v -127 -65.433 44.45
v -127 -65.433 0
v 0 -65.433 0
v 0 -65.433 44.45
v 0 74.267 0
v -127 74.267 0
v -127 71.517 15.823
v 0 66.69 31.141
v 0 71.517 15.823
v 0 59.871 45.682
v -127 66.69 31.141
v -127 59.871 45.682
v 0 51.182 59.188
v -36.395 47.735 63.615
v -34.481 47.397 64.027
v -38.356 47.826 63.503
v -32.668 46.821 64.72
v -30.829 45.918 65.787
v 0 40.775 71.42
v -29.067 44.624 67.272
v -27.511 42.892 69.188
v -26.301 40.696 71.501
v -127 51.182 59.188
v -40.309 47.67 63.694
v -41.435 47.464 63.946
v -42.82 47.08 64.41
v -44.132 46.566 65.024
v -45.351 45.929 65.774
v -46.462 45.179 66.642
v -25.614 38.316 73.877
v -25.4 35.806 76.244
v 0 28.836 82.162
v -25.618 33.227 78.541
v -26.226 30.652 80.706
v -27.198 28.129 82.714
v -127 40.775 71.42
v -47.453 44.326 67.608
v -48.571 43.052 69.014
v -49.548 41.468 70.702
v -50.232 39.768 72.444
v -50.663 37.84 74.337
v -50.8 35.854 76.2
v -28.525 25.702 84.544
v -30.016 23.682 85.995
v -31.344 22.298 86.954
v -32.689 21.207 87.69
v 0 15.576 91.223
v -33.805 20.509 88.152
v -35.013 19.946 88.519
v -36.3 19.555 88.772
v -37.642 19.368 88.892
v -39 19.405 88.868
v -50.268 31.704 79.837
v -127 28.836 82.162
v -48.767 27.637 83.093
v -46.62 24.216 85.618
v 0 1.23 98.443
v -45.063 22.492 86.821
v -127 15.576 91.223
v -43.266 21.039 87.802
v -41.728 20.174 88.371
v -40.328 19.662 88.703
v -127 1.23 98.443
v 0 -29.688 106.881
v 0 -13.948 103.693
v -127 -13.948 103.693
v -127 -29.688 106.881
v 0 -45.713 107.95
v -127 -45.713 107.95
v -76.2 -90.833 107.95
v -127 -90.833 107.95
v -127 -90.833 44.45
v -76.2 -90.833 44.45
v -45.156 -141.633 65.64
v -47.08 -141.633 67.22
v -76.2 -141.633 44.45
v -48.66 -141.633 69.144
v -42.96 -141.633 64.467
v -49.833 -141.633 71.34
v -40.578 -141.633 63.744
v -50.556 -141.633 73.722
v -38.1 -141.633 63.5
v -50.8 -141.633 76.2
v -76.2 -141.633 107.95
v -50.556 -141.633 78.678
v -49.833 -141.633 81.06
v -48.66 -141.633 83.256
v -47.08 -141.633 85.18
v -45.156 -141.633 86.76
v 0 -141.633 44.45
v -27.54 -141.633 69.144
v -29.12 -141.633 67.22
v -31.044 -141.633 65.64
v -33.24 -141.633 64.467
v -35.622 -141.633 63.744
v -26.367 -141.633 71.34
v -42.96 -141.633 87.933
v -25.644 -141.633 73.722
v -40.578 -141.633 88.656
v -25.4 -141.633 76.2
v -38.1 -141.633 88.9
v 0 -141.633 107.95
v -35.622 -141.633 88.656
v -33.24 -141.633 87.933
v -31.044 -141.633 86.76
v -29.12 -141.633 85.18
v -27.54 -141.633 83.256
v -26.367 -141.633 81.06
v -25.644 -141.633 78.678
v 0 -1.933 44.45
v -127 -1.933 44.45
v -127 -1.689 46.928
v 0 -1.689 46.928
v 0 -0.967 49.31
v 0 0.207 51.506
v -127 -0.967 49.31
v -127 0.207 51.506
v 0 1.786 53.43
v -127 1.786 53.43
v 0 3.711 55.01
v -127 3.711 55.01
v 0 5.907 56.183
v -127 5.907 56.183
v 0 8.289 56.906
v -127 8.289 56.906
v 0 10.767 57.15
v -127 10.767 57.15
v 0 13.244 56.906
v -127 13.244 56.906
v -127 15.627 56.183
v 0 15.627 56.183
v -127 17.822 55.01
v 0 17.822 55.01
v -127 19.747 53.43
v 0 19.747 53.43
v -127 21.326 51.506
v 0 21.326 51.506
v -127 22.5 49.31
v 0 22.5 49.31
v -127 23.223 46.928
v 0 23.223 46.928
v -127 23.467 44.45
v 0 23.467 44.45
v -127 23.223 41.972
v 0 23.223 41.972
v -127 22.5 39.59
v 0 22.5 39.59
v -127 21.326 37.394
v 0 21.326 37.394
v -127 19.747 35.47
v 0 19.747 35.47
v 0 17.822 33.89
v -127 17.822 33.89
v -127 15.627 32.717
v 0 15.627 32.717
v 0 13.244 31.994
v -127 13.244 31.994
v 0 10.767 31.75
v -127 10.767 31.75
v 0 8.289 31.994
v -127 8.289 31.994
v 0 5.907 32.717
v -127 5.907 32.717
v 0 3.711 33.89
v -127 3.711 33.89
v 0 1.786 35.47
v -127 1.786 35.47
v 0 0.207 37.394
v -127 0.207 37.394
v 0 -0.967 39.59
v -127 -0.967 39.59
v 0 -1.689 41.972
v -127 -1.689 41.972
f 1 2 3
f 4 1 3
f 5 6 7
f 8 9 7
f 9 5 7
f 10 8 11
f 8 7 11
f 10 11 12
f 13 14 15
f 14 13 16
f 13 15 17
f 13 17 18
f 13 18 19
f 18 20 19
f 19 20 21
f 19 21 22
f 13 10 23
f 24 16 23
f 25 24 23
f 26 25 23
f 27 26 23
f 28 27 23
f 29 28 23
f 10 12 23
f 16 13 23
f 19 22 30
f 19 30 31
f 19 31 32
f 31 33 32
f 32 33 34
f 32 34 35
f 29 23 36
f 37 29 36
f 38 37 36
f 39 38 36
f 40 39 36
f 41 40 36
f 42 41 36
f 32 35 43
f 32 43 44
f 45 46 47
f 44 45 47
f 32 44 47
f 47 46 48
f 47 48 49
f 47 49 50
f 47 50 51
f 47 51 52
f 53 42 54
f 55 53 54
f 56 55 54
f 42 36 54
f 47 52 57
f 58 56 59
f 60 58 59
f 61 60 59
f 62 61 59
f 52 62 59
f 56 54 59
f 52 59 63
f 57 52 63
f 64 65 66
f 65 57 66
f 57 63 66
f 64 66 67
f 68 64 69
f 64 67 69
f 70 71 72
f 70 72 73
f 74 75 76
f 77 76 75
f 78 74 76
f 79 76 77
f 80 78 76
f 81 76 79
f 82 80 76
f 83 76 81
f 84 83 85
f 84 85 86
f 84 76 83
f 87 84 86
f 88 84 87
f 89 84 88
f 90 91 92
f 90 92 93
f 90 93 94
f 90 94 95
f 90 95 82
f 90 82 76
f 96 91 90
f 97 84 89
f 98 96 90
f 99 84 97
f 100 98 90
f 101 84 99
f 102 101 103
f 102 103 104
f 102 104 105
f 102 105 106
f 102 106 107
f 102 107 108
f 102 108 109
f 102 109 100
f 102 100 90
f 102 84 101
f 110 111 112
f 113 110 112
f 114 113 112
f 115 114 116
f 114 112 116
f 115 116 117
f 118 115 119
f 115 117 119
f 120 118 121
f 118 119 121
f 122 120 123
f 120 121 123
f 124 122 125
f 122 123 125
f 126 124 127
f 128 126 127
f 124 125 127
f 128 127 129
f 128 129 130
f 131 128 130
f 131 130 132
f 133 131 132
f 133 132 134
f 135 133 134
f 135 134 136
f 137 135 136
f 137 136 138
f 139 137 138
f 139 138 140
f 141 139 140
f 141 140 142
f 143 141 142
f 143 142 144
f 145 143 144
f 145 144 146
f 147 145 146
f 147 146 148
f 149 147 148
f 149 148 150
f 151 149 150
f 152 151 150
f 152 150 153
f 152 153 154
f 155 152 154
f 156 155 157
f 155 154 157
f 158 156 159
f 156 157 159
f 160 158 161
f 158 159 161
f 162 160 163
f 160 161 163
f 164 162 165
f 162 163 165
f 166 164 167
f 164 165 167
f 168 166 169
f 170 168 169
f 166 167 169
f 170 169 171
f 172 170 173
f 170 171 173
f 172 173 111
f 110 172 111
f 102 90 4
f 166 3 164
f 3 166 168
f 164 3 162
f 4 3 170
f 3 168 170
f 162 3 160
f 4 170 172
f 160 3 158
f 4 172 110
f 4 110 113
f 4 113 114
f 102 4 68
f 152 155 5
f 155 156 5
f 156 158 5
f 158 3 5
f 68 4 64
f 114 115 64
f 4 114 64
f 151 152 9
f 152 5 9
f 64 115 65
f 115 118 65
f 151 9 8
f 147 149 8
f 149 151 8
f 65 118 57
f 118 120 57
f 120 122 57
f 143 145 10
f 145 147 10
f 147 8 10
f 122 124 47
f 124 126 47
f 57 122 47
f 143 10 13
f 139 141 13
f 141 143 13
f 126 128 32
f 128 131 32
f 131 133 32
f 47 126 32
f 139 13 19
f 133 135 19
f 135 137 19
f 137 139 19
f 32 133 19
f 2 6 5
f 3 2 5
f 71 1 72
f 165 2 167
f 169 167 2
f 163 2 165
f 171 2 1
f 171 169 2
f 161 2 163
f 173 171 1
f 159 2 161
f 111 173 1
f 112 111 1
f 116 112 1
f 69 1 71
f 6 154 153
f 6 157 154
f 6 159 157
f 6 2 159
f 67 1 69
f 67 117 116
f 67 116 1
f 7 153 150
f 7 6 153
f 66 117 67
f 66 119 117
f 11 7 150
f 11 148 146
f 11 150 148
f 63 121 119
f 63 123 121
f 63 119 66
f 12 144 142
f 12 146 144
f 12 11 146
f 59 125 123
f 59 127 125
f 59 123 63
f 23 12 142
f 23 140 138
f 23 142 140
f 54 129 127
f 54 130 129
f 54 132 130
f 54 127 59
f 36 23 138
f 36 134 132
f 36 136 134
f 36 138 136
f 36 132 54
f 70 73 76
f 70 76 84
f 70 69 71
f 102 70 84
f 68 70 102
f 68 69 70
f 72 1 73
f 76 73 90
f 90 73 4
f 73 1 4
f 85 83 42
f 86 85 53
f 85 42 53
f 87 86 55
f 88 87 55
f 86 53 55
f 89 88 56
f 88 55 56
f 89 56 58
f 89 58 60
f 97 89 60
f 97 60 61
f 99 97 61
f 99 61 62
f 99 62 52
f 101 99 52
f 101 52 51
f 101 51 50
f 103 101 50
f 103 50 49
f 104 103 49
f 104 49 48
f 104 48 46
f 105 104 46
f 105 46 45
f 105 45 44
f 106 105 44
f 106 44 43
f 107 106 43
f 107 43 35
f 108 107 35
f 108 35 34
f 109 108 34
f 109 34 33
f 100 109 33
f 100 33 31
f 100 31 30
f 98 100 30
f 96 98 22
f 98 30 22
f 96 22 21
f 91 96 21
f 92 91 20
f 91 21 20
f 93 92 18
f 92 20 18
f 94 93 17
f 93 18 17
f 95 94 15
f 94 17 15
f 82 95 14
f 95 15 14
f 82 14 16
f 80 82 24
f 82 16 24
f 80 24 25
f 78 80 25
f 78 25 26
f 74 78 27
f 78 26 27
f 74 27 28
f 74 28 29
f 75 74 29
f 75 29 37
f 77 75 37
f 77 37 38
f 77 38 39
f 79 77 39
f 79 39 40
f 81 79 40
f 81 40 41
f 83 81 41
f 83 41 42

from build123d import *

# Parameters (mm, degrees)
F0_W        = 127
F0_H        = 139.7
F1_DEPTH    = 107.95
F2_T1_DEPTH = 726.8985851792
F3_W        = 127
F3_H        = 63.5
F4_DEPTH    = 25.4
F5_W        = 76.2
F5_H        = 63.5
F6_DEPTH    = 50.8
F8_D        = 25.4
F10_D       = 25.4


# Not quite as in the source:
# - a fillet or chamfer that OpenCascade refuses, or shapes differently, is made with other operations: its cross-section is extruded or revolved along the edge and cut away or added


with BuildPart() as f1:
    # F0 (on Top) → F1 (new body)
    with BuildSketch(Plane.XY):
        with Locations((-63.5, 4.4167287707)):
            Rectangle(F0_W, F0_H)
    extrude(amount=F1_DEPTH)

    # F2: fillet of radius 120.65 on 1 edges, made by hand

    # F2_s2 → F2_t1 (cut)
    with BuildSketch(Plane.YZ.offset(-426.9492925896)):
        with BuildLine():
            ThreePointArc((74.2667287707, 0), (34.9844946572, 76.9902377631), (-45.7129882651, 107.95))
            Line((-45.7129882651, 107.95), (74.2667287707, 107.95))
            Line((74.2667287707, 107.95), (74.2667287707, 0))
        make_face()
    extrude(amount=F2_T1_DEPTH, mode=Mode.SUBTRACT)

    # F3 (on face) → F4 (join)
    with BuildSketch(Plane.XZ.offset(65.4332712293)):
        with Locations((-63.5, 76.2)):
            Rectangle(F3_W, F3_H)
    extrude(amount=F4_DEPTH)

    # F5 (on face) → F6 (join)
    with BuildSketch(Plane.XZ.offset(90.8332712293)):
        with Locations((-38.1, 76.2)):
            Rectangle(F5_W, F5_H)
    extrude(amount=F6_DEPTH)

    # F8 (through all)
    with Locations(Plane.XZ.offset(141.6332712293)):
        with Locations((-38.1, 76.2)):
            Hole(F8_D / 2)

    # F10 (through all)
    with Locations(Plane.YZ):
        with Locations((10.7667287707, 44.45)):
            Hole(F10_D / 2)


solid = f1.part
